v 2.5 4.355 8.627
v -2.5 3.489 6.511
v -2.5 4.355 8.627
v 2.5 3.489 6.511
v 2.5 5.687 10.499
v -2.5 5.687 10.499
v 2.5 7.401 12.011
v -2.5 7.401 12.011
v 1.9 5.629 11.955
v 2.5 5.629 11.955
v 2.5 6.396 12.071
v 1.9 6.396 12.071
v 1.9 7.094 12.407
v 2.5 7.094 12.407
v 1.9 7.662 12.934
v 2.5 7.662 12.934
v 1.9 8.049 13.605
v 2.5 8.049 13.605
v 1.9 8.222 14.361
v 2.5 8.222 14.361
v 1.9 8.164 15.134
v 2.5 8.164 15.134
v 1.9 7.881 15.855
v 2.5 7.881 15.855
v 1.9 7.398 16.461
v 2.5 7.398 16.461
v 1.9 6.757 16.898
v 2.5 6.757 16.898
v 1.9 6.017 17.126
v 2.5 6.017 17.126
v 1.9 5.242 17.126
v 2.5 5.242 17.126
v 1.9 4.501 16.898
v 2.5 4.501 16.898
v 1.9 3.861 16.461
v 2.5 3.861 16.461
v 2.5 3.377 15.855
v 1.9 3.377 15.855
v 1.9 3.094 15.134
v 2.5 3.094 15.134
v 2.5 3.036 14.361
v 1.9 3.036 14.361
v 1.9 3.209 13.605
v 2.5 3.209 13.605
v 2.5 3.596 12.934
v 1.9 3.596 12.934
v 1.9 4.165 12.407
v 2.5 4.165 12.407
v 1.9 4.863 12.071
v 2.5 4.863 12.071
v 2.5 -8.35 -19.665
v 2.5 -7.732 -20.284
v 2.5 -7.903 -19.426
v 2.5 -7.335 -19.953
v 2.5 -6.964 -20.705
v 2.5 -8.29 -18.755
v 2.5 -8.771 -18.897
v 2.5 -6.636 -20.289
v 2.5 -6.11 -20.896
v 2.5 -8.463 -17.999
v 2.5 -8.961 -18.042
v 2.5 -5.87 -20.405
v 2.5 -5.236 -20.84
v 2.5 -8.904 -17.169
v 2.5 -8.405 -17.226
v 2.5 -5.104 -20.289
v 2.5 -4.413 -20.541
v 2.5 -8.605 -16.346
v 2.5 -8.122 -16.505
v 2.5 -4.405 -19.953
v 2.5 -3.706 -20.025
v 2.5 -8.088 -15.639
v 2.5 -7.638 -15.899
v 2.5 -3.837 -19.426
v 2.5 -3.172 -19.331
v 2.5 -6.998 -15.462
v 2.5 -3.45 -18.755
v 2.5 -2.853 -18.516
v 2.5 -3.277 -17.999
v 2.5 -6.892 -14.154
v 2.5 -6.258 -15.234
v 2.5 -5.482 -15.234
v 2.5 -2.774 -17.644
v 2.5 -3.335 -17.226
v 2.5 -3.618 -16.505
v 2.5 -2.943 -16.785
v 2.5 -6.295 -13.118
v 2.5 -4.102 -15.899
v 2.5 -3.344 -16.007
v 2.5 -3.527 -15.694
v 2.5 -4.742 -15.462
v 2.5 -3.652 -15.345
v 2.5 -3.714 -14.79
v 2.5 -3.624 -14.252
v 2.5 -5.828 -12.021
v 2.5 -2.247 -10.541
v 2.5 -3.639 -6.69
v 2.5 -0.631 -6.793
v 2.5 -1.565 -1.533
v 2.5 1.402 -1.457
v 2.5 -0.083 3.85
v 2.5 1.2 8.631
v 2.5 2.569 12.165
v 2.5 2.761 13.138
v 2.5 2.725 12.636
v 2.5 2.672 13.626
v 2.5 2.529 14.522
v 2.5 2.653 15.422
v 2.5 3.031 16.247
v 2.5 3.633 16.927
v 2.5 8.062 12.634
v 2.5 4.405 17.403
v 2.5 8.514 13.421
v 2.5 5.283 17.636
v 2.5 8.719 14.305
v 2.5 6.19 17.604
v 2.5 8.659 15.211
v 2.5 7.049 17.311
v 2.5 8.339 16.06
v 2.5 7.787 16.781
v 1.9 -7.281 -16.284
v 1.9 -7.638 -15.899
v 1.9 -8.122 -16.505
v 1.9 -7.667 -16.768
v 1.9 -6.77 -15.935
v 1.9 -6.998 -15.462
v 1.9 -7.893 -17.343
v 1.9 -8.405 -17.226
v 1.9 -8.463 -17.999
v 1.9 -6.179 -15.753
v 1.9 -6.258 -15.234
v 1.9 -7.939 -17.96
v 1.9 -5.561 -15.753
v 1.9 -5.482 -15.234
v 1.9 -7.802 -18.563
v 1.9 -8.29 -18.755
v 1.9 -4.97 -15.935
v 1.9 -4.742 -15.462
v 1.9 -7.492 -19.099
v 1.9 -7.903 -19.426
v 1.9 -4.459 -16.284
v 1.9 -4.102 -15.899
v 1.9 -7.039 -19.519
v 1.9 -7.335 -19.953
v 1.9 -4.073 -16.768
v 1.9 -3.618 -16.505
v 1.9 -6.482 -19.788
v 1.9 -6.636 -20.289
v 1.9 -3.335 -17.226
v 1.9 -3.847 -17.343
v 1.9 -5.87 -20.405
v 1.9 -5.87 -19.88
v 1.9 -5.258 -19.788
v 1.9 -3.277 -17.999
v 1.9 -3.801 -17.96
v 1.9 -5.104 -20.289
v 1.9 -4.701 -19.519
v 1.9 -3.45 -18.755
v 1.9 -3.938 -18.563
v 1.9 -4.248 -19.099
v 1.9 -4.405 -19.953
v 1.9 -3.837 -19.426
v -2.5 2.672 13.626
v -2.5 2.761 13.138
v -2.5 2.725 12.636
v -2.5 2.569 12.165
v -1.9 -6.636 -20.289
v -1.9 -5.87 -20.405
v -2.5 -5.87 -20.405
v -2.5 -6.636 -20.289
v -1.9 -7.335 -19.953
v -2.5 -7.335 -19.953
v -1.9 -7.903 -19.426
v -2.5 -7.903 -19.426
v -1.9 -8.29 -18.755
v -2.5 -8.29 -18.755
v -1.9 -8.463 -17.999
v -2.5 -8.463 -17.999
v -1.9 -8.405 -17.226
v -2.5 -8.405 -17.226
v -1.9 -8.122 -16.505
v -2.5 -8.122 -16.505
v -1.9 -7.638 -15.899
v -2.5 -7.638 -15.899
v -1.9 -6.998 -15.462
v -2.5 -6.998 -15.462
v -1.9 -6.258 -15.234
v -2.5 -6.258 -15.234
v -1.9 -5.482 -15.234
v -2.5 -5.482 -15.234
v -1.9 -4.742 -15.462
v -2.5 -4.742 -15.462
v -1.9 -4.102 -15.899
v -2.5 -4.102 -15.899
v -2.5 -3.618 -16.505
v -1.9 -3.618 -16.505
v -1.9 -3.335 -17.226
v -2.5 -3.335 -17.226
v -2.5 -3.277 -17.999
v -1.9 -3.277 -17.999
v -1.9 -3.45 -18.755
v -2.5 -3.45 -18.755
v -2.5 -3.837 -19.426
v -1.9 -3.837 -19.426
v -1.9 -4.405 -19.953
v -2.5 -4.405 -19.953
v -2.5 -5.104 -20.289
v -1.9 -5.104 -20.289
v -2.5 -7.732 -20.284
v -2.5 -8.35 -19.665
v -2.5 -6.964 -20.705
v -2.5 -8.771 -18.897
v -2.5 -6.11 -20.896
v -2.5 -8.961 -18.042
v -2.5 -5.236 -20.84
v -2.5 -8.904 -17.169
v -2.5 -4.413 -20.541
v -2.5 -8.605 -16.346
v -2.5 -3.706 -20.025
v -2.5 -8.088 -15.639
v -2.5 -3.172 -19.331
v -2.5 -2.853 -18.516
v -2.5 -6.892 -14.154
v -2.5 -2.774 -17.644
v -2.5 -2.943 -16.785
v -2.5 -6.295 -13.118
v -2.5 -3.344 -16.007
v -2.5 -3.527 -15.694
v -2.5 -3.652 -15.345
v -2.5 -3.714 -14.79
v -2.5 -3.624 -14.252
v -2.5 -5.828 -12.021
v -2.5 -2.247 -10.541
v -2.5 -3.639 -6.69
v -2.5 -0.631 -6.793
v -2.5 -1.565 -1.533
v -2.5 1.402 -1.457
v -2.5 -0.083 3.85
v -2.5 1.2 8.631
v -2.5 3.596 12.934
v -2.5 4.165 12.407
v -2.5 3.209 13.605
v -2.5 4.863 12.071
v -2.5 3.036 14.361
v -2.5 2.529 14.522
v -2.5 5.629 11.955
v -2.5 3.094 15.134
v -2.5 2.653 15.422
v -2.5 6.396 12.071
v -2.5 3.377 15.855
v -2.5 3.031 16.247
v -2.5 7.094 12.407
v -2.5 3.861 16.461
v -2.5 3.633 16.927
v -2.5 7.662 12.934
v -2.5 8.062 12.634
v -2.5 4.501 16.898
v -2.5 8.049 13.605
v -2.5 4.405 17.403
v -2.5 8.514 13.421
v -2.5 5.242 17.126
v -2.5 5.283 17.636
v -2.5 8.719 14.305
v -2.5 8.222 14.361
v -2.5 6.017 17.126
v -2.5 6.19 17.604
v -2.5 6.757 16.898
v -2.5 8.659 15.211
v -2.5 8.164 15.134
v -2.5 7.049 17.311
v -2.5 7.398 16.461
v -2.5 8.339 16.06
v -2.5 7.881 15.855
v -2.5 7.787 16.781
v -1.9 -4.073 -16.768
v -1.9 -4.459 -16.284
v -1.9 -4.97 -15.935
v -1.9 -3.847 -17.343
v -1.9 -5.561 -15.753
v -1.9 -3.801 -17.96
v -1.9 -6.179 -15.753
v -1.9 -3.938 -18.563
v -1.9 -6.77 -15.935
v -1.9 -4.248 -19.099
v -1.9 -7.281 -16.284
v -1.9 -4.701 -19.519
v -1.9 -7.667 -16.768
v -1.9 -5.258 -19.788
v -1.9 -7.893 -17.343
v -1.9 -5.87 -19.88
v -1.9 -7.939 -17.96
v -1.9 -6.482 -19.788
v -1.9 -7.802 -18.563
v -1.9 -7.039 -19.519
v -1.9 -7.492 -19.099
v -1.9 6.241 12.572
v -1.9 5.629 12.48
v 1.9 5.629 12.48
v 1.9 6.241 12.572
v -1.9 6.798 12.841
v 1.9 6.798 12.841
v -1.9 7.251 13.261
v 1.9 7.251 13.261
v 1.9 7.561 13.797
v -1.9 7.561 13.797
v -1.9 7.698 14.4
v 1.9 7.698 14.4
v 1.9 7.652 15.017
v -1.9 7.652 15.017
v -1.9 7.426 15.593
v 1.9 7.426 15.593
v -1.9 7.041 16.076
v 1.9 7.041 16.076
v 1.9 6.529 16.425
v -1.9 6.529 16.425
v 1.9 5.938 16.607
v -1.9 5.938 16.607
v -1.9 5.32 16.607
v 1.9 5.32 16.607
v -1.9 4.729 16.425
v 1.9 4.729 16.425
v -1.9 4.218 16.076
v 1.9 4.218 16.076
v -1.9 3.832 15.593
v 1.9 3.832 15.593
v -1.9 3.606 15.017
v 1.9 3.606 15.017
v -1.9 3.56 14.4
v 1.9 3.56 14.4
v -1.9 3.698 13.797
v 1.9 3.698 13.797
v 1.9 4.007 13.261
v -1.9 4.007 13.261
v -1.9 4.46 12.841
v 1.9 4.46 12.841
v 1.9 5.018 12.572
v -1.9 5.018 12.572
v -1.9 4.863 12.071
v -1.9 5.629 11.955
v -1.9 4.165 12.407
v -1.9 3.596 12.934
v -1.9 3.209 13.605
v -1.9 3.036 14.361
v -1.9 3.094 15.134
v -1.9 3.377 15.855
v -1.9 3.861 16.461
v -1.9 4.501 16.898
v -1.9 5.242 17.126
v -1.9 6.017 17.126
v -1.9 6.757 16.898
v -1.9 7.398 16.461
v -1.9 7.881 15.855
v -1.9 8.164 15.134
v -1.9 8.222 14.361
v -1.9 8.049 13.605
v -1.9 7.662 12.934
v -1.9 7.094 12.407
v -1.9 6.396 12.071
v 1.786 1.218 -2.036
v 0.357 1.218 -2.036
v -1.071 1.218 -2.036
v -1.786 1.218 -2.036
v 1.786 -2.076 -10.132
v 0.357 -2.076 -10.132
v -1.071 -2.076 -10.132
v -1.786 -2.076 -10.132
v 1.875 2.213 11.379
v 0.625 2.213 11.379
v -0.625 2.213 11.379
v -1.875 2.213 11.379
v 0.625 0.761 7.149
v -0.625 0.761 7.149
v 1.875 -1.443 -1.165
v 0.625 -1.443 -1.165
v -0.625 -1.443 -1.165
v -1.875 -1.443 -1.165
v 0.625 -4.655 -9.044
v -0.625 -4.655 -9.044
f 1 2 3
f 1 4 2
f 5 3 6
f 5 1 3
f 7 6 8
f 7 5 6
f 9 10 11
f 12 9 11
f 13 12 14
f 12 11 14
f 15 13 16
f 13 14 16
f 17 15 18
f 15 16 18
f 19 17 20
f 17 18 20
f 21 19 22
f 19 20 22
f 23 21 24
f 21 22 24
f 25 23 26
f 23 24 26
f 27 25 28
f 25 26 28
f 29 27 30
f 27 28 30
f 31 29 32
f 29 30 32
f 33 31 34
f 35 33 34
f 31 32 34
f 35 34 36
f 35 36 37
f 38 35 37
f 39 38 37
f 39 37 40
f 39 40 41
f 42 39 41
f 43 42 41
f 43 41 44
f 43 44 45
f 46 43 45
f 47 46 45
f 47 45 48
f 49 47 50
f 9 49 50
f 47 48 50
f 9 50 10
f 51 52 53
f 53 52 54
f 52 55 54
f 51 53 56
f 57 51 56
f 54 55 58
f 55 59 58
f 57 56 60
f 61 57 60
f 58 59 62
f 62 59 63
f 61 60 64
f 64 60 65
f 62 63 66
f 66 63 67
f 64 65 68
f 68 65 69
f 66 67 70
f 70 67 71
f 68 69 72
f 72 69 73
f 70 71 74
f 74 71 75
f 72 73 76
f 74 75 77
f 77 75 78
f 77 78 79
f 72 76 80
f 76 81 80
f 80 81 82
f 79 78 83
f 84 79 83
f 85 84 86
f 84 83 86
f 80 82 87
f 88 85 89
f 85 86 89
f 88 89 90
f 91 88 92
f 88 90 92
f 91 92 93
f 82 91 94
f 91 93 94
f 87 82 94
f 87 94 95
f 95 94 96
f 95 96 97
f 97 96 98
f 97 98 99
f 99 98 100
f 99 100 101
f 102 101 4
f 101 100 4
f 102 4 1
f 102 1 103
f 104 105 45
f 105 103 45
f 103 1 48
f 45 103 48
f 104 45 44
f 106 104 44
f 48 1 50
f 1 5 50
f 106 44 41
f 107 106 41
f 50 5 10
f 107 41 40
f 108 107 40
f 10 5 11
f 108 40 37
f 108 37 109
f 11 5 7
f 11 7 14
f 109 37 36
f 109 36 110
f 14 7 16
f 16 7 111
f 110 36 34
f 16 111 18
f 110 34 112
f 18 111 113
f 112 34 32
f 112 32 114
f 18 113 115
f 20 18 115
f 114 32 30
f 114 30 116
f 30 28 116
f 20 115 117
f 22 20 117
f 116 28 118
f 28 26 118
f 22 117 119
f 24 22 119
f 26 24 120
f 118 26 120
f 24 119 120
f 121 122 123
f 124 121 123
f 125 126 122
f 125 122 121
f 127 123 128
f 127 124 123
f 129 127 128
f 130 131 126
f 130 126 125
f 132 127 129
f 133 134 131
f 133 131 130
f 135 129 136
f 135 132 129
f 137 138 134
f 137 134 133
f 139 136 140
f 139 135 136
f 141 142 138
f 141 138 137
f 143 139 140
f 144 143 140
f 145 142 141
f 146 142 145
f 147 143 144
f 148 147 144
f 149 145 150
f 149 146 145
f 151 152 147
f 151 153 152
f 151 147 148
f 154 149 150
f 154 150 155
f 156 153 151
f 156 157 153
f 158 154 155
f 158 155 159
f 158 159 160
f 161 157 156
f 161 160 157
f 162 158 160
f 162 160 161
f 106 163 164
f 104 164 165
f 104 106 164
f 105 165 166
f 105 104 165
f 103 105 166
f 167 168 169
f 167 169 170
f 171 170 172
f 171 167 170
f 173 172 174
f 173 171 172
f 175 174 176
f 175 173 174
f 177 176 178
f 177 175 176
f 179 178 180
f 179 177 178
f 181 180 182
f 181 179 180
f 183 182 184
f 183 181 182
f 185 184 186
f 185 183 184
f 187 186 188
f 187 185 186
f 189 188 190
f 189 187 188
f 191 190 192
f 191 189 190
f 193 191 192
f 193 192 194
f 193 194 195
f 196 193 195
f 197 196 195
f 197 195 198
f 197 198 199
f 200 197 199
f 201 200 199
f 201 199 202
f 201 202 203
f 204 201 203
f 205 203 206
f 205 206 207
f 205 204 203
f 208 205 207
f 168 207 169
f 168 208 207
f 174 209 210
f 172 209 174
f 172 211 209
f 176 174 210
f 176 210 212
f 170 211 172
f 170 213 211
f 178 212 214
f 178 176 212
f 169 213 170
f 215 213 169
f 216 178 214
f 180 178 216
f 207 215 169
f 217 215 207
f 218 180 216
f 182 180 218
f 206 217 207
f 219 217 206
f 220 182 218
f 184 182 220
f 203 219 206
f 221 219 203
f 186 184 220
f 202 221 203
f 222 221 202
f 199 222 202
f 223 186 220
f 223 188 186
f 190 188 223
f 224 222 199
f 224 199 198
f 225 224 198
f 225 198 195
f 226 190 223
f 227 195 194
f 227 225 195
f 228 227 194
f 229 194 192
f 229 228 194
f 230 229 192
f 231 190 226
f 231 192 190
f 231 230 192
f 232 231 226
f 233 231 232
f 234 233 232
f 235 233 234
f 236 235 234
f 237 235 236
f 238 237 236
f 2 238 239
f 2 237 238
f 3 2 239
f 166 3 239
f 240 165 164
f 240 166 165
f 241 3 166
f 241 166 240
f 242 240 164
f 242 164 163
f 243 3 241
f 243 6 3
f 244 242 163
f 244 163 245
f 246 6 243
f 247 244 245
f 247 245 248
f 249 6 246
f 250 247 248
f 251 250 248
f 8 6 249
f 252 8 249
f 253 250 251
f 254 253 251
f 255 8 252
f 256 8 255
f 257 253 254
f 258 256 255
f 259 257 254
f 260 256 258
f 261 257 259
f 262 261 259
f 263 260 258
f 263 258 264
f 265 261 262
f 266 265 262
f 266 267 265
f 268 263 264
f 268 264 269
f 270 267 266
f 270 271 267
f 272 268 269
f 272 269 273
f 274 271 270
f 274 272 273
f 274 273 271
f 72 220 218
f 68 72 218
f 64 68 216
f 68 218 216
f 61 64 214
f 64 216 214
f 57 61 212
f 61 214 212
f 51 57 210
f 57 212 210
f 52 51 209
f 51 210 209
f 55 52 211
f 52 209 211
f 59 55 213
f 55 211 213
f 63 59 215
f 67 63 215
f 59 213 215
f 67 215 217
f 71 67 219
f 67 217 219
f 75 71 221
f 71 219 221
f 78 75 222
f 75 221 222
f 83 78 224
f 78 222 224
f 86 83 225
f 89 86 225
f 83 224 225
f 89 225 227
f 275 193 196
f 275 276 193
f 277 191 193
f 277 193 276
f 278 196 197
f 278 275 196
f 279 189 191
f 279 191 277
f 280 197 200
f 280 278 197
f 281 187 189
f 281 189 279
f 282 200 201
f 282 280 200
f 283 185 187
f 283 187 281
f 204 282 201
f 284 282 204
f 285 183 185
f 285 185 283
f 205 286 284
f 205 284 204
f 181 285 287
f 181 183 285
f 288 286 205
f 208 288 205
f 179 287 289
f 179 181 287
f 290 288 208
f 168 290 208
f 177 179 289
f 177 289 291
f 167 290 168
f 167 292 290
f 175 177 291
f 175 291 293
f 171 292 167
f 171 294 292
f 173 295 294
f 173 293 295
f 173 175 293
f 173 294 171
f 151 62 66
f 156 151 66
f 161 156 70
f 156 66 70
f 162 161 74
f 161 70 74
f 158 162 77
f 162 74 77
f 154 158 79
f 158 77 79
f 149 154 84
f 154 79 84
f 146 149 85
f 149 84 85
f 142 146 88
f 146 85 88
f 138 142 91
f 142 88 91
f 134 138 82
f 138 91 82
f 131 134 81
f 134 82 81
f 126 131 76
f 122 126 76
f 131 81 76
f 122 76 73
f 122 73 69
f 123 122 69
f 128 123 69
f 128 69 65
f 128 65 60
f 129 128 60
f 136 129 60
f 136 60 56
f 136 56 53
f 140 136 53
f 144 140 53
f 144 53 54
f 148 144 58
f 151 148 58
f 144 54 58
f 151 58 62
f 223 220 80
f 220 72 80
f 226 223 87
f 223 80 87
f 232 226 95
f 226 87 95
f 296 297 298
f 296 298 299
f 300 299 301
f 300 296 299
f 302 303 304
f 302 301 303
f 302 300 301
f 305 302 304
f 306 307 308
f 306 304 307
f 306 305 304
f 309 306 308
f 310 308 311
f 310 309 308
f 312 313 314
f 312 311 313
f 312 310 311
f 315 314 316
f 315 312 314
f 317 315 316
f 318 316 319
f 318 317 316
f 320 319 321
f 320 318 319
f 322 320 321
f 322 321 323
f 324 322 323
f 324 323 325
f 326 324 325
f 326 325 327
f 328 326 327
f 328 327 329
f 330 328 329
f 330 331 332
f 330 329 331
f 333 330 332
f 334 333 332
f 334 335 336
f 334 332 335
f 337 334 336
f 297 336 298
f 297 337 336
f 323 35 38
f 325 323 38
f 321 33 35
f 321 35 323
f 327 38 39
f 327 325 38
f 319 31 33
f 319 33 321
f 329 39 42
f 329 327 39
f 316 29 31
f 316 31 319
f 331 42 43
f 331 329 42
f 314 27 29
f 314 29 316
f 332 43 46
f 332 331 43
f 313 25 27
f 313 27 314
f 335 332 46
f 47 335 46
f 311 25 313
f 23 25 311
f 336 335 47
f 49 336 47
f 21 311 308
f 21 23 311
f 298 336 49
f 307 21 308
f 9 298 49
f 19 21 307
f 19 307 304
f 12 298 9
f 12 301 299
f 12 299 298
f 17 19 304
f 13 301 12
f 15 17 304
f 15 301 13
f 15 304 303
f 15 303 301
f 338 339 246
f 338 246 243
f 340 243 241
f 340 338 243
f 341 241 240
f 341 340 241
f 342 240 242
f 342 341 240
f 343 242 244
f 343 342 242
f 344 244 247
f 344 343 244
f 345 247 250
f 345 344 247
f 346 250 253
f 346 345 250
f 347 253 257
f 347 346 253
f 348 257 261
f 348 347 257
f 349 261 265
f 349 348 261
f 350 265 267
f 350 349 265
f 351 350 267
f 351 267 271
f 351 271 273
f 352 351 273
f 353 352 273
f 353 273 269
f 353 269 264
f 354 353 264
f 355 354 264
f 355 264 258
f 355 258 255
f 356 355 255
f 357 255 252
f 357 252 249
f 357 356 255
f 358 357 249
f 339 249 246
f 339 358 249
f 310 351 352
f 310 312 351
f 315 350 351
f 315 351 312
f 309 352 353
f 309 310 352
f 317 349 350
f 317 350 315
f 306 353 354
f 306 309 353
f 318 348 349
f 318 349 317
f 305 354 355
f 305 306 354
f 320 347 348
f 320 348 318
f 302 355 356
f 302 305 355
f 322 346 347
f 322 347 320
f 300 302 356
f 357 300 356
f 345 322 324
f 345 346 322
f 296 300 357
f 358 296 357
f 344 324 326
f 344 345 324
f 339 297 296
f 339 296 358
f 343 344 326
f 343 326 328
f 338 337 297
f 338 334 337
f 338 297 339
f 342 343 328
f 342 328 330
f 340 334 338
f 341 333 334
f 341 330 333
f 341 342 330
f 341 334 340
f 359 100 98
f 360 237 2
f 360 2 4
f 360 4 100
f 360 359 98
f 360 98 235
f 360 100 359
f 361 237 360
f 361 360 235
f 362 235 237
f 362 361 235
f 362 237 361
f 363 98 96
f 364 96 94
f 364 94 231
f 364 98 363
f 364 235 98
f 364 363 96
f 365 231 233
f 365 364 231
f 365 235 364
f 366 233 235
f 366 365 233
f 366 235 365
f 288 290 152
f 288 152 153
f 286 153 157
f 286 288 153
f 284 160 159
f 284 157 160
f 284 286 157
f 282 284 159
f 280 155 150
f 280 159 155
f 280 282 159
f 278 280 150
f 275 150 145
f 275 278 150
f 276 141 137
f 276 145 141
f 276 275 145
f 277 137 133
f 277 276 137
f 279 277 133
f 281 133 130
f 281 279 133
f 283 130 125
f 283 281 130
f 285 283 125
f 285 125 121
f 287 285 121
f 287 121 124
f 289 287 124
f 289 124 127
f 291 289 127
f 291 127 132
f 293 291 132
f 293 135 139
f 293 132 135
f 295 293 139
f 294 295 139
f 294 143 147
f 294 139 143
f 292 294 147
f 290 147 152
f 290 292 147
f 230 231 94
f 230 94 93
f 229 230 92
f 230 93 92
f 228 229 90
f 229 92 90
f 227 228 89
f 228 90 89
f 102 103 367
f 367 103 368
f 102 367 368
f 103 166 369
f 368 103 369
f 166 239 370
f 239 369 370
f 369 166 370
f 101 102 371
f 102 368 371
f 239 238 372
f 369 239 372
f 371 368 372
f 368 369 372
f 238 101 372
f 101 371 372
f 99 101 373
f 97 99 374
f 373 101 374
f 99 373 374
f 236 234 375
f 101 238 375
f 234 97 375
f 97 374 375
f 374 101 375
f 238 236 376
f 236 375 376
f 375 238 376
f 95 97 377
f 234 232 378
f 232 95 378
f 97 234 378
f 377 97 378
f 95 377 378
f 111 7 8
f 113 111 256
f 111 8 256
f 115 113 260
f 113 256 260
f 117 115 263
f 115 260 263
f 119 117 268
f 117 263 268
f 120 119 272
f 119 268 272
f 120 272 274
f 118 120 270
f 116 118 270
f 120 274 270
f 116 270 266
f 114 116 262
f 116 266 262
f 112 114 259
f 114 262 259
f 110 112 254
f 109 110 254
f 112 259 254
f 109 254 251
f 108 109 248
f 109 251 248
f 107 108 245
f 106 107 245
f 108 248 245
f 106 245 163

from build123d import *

# Parameters (mm, degrees)
BOSS_EXTRUDE1_START     = -2.5
BOSS_EXTRUDE1_OUTLINE_R = 2.075
BOSS_EXTRUDE1_DEPTH     = 5
FILLET1_R               = 10
FILLET2_R               = 2
SKETCH6_R               = 2.6
CUT_EXTRUDE3_DEPTH      = 0.6
CUT_EXTRUDE4_START      = -0.6
SKETCH7_R               = 2.6
CUT_EXTRUDE4_DEPTH      = 0.6


# Read off the part's stored shape, not the designer's step: Boss-Extrude1
with BuildPart() as part:
    # Boss-Extrude1 outline → Boss-Extrude1 (new body)
    with BuildSketch(Plane(origin=(0, 0, 0), x_dir=(0, 0, -1), z_dir=(1, 0, 0)).offset(BOSS_EXTRUDE1_START)):
        with BuildLine():
            add(Edge.make_bspline(
                [(-11.467759302, 5.348193827), (-9.897325632, 4.539306529), (-6.914913615, 3.521436488), (-2.263899905, 2.426855128), (2.06634335, 1.307705864), (6.2118215, -0.350082751), (10.140310372, -2.114581028), (13.169191833, -3.310542475), (14.923737301, -3.829233653), (15.372310037, -3.948537134)],
                knots=[0.083247791, 0.083247791, 0.083247791, 0.083247791, 0.25, 0.375, 0.5, 0.625, 0.75, 0.875, 0.917679059, 0.917679059, 0.917679059, 0.917679059], degree=3))
            ThreePointArc((-11.467759302, 5.348193827), (-17.179981816, 7.278246829), (-12.961908872, 2.969830498))
            add(Edge.make_bspline(
                [(-12.961908872, 2.969830498), (-12.439456061, 2.692527792), (-10.540790951, 1.792456097), (-7.150824595, 0.699411978), (-2.87827779, -0.304494056), (1.198988752, -1.360799538), (5.069797155, -2.90772863), (9.016006033, -4.678857357), (12.277896091, -5.971009628), (14.261338764, -6.553588571), (14.817570219, -6.697806322)],
                knots=[0.076895227, 0.076895227, 0.076895227, 0.076895227, 0.125, 0.25, 0.375, 0.5, 0.625, 0.75, 0.875, 0.922454156, 0.922454156, 0.922454156, 0.922454156], degree=3))
            ThreePointArc((14.817570219, -6.697806322), (20.84375711, -6.483151878), (15.372310037, -3.948537134))
        make_face()
        with Locations((17.805, -5.87)):
            Circle(BOSS_EXTRUDE1_OUTLINE_R, mode=Mode.SUBTRACT)
        with Locations((-14.555, 5.629165125)):
            Circle(BOSS_EXTRUDE1_OUTLINE_R, mode=Mode.SUBTRACT)
    extrude(amount=BOSS_EXTRUDE1_DEPTH)

    # Fillet1
    fillet1_edges = [part.edges().sort_by_distance(p)[0] for p in [
        (0, -6.697806322, -14.817570219),
        (0, 5.348193827, 11.467759302),
    ]]
    fillet(fillet1_edges, radius=FILLET1_R)

    # Fillet2
    fillet2_edges = [part.edges().sort_by_distance(p)[0] for p in [
        (0, -3.948537134, -15.372310037),
        (0, 2.969830498, 12.961908872),
    ]]
    fillet(fillet2_edges, radius=FILLET2_R)

    # Sketch6 → Cut-Extrude3 (cut)
    with BuildSketch(Plane(origin=(2.5, 0, 0), x_dir=(0, 0, -1), z_dir=(1, 0, 0))):
        with Locations((-14.555, 5.629165125)):
            Circle(SKETCH6_R)
        with Locations((17.805, -5.87)):
            Circle(SKETCH6_R)
    extrude(amount=-CUT_EXTRUDE3_DEPTH, mode=Mode.SUBTRACT)

    # Sketch7 → Cut-Extrude4 (cut)
    with BuildSketch(Plane.ZY.offset(2.5).offset(CUT_EXTRUDE4_START)):
        with Locations(Location((14.555, 5.629165125, 0), (0, 0, 180))):
            Circle(SKETCH7_R)
        with Locations(Location((-17.805, -5.87, 0), (0, 0, 180))):
            Circle(SKETCH7_R)
    extrude(amount=CUT_EXTRUDE4_DEPTH, mode=Mode.SUBTRACT)


solid = part.part
